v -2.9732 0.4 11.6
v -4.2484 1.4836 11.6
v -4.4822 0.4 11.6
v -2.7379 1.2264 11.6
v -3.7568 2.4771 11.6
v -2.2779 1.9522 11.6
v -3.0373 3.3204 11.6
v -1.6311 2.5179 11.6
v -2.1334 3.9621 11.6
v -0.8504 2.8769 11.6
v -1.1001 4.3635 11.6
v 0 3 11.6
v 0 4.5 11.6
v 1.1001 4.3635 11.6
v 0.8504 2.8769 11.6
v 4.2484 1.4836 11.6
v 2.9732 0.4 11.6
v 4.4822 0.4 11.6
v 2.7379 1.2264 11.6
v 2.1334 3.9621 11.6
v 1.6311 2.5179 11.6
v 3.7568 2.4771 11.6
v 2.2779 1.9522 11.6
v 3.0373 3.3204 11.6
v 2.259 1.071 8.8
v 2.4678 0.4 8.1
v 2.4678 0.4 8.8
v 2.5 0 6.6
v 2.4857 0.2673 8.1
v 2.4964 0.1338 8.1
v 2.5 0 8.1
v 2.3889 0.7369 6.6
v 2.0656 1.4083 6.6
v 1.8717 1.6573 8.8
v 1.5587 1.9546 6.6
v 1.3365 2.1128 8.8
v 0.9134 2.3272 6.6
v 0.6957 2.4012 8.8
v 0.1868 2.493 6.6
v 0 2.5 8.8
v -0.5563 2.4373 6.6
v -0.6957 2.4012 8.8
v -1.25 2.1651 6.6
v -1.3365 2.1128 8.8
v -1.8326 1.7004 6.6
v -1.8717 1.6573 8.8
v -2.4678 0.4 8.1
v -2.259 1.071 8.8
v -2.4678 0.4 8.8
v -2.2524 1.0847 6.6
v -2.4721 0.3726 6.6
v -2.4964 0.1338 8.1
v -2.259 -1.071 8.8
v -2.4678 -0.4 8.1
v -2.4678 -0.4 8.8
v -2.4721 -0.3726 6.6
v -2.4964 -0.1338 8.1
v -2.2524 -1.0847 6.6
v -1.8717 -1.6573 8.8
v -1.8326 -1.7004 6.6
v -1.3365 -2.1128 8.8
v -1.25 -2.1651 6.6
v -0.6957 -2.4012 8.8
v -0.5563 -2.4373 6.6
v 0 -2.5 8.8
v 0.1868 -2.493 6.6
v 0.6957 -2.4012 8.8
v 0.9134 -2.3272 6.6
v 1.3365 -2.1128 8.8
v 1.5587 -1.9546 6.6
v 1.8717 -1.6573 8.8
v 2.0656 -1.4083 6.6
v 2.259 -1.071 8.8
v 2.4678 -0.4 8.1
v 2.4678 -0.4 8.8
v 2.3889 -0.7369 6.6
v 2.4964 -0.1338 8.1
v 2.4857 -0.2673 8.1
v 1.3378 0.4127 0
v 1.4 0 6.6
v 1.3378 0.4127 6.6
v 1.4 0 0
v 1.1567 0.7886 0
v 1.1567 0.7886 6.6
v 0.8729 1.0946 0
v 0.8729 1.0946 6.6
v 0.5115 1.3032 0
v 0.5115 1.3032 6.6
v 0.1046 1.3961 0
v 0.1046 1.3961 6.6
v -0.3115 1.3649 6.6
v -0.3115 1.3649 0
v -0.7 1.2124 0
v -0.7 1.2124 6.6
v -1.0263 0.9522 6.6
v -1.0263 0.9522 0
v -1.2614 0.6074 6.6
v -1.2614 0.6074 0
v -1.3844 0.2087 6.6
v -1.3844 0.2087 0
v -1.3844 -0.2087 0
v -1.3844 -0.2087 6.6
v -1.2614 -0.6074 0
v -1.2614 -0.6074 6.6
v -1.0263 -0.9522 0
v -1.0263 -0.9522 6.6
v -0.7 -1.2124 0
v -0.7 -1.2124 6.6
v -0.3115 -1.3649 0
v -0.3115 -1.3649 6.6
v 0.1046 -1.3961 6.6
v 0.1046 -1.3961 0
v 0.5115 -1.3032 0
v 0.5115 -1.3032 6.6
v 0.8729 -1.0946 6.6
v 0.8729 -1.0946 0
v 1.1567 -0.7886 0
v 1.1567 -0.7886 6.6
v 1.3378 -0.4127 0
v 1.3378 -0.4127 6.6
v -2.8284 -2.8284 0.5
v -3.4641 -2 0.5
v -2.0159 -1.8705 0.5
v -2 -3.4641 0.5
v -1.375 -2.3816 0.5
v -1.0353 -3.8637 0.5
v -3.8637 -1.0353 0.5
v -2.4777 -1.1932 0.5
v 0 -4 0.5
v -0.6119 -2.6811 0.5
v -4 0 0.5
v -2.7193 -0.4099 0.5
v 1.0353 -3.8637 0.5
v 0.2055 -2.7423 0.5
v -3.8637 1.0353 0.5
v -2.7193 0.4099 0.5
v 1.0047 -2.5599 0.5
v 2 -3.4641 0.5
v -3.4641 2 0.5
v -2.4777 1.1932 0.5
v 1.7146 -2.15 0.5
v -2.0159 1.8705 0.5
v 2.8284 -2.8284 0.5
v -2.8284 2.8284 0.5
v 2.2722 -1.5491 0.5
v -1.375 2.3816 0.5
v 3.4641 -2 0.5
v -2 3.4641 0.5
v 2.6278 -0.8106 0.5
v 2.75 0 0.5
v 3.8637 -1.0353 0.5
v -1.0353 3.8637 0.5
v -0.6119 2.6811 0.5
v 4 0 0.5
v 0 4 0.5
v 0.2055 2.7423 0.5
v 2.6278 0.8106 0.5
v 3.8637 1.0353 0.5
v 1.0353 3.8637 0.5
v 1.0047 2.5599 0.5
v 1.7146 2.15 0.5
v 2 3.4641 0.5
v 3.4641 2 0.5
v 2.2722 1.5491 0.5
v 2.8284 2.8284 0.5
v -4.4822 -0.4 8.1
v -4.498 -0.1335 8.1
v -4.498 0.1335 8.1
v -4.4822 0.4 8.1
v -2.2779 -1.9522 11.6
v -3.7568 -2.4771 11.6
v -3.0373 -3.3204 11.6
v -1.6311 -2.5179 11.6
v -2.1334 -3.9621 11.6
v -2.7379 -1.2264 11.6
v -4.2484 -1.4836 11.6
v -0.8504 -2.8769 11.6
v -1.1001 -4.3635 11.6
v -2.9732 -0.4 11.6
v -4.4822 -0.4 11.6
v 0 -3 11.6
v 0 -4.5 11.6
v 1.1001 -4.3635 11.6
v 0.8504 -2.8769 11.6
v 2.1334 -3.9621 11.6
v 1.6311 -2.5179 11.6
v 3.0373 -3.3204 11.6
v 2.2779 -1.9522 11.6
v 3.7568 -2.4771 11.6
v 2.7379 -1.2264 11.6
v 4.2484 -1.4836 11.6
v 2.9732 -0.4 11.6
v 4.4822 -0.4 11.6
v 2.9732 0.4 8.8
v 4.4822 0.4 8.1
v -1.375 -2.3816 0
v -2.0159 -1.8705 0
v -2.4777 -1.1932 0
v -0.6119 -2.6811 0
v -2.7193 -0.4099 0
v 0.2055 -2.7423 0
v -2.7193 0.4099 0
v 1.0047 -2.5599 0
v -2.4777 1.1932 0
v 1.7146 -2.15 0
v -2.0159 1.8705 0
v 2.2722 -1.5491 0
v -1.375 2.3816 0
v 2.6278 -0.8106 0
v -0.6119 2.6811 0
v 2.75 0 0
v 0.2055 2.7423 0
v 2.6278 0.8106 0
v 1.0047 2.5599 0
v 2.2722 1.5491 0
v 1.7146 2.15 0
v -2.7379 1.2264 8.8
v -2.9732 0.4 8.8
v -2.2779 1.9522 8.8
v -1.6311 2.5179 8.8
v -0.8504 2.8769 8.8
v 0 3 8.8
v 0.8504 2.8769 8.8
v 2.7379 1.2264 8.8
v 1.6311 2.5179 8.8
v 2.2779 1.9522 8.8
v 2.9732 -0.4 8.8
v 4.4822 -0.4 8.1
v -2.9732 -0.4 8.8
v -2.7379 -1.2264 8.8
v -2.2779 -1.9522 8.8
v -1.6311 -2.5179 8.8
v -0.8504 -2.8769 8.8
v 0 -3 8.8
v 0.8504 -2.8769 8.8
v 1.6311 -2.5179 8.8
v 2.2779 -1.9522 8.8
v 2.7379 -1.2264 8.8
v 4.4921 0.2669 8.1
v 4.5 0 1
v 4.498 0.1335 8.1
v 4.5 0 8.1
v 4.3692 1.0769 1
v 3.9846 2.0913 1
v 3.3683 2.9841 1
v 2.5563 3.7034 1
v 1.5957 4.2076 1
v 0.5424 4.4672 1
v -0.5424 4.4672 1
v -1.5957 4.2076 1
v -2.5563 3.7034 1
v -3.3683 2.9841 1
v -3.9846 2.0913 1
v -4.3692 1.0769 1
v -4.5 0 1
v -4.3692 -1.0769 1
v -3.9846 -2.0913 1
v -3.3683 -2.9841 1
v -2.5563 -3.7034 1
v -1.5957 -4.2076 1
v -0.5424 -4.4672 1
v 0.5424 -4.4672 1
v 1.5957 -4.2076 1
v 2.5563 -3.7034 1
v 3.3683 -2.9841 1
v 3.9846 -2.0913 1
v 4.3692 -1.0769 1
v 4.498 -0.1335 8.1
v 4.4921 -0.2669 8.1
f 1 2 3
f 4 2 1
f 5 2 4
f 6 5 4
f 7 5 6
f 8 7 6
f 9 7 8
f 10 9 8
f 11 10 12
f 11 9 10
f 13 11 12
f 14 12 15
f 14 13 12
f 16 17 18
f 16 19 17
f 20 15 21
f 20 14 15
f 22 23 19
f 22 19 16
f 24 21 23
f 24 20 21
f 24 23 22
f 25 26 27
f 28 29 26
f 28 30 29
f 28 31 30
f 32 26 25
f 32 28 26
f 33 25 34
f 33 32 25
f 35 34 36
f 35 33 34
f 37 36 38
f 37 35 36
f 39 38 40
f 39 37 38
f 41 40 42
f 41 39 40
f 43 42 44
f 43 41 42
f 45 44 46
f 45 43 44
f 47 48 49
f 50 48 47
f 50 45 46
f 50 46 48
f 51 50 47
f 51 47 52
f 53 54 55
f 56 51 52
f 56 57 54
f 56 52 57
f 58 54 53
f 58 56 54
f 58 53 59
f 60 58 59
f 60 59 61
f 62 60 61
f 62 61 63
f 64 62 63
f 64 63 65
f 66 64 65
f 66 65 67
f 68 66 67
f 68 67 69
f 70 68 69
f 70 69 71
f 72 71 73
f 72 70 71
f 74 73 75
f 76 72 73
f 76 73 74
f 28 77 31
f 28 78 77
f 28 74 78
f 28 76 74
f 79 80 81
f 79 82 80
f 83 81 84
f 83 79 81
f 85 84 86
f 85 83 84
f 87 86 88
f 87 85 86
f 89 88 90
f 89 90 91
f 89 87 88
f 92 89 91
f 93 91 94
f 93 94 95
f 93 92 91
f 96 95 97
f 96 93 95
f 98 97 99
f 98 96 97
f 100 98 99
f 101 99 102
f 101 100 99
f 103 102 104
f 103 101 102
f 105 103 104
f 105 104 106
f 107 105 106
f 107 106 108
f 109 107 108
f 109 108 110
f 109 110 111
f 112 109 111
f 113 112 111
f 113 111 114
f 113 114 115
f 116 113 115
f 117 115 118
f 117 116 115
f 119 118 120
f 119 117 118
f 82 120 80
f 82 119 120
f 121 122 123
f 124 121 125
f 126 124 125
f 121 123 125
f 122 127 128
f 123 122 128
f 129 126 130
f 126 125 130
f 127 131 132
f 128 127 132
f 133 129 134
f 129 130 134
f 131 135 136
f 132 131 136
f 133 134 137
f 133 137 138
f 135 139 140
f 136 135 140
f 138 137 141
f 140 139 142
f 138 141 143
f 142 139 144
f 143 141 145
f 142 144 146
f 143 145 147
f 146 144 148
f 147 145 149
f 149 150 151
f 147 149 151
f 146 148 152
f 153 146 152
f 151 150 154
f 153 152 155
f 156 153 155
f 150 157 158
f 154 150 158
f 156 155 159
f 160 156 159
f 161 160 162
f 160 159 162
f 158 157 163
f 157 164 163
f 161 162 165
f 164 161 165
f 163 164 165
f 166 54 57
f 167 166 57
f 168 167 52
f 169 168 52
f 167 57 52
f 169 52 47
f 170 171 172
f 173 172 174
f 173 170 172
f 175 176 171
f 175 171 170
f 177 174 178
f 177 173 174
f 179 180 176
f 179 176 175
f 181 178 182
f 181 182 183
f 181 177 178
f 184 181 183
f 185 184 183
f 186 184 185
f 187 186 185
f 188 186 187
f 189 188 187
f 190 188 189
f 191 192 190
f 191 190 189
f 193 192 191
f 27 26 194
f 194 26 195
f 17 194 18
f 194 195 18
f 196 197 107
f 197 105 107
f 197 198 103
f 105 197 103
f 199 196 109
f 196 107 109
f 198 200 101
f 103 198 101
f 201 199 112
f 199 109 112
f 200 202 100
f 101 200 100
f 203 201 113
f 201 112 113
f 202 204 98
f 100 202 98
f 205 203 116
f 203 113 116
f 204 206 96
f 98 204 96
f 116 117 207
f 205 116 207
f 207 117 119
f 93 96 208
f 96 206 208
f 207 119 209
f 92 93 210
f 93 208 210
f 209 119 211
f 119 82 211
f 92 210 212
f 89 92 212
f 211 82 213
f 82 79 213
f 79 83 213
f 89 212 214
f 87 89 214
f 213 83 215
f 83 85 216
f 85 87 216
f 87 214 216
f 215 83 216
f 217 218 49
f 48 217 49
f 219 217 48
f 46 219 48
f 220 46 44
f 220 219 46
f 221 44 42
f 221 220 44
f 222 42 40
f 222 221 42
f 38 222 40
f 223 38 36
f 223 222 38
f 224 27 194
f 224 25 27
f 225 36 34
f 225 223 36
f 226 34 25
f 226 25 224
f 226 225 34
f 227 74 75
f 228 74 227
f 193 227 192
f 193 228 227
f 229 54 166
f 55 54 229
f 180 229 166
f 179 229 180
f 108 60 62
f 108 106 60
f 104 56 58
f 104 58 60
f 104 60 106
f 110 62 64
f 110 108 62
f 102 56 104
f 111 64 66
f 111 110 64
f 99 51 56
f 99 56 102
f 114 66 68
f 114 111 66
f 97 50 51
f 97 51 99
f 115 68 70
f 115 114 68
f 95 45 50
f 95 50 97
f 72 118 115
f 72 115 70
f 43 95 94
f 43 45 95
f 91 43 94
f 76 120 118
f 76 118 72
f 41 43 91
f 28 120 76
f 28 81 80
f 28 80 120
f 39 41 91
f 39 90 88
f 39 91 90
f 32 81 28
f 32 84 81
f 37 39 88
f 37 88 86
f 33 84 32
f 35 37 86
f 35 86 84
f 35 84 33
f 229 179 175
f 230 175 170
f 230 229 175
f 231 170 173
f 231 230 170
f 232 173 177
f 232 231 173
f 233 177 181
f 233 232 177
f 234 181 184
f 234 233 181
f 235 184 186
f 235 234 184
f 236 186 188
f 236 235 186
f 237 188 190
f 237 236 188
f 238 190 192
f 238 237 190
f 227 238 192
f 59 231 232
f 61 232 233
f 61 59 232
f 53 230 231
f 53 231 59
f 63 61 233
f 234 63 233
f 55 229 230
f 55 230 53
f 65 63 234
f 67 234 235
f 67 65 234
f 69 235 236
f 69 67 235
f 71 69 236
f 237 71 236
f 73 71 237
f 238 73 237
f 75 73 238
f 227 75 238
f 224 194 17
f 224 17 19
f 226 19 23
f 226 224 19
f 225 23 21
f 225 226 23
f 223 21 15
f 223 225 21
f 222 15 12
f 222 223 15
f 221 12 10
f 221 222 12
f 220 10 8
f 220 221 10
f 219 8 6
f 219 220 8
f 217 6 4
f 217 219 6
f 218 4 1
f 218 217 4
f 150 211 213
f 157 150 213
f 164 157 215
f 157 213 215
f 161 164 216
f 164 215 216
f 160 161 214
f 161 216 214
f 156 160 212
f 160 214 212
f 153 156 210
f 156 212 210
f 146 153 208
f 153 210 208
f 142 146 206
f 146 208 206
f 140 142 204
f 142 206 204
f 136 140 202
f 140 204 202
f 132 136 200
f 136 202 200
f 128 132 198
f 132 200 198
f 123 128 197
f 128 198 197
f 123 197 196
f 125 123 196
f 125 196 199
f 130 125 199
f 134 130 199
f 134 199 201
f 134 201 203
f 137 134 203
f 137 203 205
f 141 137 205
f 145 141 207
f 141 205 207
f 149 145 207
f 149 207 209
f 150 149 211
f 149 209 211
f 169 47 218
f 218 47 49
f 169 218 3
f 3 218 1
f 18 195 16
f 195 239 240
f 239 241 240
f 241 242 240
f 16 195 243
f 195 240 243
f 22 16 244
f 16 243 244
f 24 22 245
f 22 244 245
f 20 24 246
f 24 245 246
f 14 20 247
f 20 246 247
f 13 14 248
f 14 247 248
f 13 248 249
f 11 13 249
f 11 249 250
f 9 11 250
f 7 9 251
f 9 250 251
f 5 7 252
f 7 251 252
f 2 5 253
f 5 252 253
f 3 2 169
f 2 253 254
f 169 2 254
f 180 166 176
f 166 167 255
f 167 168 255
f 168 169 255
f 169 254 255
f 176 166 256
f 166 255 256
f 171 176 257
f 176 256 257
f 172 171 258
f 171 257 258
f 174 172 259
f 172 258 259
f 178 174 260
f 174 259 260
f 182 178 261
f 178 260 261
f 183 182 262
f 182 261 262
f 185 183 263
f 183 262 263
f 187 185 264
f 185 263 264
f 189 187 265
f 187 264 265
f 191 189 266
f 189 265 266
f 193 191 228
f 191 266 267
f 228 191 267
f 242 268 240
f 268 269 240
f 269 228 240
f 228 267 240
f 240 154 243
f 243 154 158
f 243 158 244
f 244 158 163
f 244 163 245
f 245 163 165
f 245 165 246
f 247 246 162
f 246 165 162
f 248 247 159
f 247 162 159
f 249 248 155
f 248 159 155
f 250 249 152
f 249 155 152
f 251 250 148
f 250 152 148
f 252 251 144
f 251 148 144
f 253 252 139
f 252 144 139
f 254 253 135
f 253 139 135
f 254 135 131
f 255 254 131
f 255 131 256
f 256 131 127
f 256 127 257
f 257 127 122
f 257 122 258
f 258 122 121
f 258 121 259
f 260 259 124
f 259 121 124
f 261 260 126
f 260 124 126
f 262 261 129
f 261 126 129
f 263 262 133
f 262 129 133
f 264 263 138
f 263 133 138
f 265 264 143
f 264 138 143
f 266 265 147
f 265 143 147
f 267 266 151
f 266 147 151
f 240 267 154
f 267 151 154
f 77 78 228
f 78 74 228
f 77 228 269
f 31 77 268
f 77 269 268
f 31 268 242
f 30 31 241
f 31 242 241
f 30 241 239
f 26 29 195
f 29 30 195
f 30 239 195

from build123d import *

# Parameters (mm, degrees)
SKETCH1_R           = 2.75
SKETCH1_R_2         = 1.4
BOSS_EXTRUDE1_DEPTH = 0.5
SKETCH2_R           = 4.5
SKETCH2_R_2         = 1.4
BOSS_EXTRUDE2_DEPTH = 6.1
CHAMFER1_SIZE       = 0.5
SKETCH3_R           = 4.5
SKETCH3_R_2         = 2.5
BOSS_EXTRUDE3_DEPTH = 2.2
SKETCH4_R           = 4.5
SKETCH4_R_2         = 3
BOSS_EXTRUDE4_DEPTH = 2.8
SKETCH5_W           = 0.8
SKETCH5_H           = 3.5
CUT_EXTRUDE1_DEPTH  = 4.5


with BuildPart() as part:
    # Sketch1 → Boss-Extrude1 (new body)
    with BuildSketch(Plane(origin=(0, 0, 0), x_dir=(0, 1, 0), z_dir=(0, 0, 1))):
        with Locations(Location((0, 0, 0), (0, 0, 270))):
            Circle(SKETCH1_R)
        with Locations(Location((0, 0, 0), (0, 0, 270))):
            Circle(SKETCH1_R_2, mode=Mode.SUBTRACT)
    extrude(amount=BOSS_EXTRUDE1_DEPTH)

    # Sketch2 → Boss-Extrude2 (add)
    with BuildSketch(Plane.XY.offset(0.5)):
        Circle(SKETCH2_R)
        Circle(SKETCH2_R_2, mode=Mode.SUBTRACT)
    extrude(amount=BOSS_EXTRUDE2_DEPTH)

    # Chamfer1
    chamfer1_edges = [part.edges().sort_by_distance(p)[0] for p in [
        (-4.5, 0, 0.5),
    ]]
    chamfer(chamfer1_edges, length=CHAMFER1_SIZE)

    # Sketch3 → Boss-Extrude3 (add)
    with BuildSketch(Plane.XY.offset(6.6)):
        Circle(SKETCH3_R)
        Circle(SKETCH3_R_2, mode=Mode.SUBTRACT)
    extrude(amount=BOSS_EXTRUDE3_DEPTH)

    # Sketch4 → Boss-Extrude4 (add)
    with BuildSketch(Plane.XY.offset(8.8)):
        Circle(SKETCH4_R)
        Circle(SKETCH4_R_2, mode=Mode.SUBTRACT)
    extrude(amount=BOSS_EXTRUDE4_DEPTH)

    # Sketch5 → Cut-Extrude1 (cut, symmetric)
    with BuildSketch(Plane.YZ):
        with Locations((0, 9.85)):
            Rectangle(SKETCH5_W, SKETCH5_H)
    extrude(amount=CUT_EXTRUDE1_DEPTH, both=True, mode=Mode.SUBTRACT)


solid = part.part
